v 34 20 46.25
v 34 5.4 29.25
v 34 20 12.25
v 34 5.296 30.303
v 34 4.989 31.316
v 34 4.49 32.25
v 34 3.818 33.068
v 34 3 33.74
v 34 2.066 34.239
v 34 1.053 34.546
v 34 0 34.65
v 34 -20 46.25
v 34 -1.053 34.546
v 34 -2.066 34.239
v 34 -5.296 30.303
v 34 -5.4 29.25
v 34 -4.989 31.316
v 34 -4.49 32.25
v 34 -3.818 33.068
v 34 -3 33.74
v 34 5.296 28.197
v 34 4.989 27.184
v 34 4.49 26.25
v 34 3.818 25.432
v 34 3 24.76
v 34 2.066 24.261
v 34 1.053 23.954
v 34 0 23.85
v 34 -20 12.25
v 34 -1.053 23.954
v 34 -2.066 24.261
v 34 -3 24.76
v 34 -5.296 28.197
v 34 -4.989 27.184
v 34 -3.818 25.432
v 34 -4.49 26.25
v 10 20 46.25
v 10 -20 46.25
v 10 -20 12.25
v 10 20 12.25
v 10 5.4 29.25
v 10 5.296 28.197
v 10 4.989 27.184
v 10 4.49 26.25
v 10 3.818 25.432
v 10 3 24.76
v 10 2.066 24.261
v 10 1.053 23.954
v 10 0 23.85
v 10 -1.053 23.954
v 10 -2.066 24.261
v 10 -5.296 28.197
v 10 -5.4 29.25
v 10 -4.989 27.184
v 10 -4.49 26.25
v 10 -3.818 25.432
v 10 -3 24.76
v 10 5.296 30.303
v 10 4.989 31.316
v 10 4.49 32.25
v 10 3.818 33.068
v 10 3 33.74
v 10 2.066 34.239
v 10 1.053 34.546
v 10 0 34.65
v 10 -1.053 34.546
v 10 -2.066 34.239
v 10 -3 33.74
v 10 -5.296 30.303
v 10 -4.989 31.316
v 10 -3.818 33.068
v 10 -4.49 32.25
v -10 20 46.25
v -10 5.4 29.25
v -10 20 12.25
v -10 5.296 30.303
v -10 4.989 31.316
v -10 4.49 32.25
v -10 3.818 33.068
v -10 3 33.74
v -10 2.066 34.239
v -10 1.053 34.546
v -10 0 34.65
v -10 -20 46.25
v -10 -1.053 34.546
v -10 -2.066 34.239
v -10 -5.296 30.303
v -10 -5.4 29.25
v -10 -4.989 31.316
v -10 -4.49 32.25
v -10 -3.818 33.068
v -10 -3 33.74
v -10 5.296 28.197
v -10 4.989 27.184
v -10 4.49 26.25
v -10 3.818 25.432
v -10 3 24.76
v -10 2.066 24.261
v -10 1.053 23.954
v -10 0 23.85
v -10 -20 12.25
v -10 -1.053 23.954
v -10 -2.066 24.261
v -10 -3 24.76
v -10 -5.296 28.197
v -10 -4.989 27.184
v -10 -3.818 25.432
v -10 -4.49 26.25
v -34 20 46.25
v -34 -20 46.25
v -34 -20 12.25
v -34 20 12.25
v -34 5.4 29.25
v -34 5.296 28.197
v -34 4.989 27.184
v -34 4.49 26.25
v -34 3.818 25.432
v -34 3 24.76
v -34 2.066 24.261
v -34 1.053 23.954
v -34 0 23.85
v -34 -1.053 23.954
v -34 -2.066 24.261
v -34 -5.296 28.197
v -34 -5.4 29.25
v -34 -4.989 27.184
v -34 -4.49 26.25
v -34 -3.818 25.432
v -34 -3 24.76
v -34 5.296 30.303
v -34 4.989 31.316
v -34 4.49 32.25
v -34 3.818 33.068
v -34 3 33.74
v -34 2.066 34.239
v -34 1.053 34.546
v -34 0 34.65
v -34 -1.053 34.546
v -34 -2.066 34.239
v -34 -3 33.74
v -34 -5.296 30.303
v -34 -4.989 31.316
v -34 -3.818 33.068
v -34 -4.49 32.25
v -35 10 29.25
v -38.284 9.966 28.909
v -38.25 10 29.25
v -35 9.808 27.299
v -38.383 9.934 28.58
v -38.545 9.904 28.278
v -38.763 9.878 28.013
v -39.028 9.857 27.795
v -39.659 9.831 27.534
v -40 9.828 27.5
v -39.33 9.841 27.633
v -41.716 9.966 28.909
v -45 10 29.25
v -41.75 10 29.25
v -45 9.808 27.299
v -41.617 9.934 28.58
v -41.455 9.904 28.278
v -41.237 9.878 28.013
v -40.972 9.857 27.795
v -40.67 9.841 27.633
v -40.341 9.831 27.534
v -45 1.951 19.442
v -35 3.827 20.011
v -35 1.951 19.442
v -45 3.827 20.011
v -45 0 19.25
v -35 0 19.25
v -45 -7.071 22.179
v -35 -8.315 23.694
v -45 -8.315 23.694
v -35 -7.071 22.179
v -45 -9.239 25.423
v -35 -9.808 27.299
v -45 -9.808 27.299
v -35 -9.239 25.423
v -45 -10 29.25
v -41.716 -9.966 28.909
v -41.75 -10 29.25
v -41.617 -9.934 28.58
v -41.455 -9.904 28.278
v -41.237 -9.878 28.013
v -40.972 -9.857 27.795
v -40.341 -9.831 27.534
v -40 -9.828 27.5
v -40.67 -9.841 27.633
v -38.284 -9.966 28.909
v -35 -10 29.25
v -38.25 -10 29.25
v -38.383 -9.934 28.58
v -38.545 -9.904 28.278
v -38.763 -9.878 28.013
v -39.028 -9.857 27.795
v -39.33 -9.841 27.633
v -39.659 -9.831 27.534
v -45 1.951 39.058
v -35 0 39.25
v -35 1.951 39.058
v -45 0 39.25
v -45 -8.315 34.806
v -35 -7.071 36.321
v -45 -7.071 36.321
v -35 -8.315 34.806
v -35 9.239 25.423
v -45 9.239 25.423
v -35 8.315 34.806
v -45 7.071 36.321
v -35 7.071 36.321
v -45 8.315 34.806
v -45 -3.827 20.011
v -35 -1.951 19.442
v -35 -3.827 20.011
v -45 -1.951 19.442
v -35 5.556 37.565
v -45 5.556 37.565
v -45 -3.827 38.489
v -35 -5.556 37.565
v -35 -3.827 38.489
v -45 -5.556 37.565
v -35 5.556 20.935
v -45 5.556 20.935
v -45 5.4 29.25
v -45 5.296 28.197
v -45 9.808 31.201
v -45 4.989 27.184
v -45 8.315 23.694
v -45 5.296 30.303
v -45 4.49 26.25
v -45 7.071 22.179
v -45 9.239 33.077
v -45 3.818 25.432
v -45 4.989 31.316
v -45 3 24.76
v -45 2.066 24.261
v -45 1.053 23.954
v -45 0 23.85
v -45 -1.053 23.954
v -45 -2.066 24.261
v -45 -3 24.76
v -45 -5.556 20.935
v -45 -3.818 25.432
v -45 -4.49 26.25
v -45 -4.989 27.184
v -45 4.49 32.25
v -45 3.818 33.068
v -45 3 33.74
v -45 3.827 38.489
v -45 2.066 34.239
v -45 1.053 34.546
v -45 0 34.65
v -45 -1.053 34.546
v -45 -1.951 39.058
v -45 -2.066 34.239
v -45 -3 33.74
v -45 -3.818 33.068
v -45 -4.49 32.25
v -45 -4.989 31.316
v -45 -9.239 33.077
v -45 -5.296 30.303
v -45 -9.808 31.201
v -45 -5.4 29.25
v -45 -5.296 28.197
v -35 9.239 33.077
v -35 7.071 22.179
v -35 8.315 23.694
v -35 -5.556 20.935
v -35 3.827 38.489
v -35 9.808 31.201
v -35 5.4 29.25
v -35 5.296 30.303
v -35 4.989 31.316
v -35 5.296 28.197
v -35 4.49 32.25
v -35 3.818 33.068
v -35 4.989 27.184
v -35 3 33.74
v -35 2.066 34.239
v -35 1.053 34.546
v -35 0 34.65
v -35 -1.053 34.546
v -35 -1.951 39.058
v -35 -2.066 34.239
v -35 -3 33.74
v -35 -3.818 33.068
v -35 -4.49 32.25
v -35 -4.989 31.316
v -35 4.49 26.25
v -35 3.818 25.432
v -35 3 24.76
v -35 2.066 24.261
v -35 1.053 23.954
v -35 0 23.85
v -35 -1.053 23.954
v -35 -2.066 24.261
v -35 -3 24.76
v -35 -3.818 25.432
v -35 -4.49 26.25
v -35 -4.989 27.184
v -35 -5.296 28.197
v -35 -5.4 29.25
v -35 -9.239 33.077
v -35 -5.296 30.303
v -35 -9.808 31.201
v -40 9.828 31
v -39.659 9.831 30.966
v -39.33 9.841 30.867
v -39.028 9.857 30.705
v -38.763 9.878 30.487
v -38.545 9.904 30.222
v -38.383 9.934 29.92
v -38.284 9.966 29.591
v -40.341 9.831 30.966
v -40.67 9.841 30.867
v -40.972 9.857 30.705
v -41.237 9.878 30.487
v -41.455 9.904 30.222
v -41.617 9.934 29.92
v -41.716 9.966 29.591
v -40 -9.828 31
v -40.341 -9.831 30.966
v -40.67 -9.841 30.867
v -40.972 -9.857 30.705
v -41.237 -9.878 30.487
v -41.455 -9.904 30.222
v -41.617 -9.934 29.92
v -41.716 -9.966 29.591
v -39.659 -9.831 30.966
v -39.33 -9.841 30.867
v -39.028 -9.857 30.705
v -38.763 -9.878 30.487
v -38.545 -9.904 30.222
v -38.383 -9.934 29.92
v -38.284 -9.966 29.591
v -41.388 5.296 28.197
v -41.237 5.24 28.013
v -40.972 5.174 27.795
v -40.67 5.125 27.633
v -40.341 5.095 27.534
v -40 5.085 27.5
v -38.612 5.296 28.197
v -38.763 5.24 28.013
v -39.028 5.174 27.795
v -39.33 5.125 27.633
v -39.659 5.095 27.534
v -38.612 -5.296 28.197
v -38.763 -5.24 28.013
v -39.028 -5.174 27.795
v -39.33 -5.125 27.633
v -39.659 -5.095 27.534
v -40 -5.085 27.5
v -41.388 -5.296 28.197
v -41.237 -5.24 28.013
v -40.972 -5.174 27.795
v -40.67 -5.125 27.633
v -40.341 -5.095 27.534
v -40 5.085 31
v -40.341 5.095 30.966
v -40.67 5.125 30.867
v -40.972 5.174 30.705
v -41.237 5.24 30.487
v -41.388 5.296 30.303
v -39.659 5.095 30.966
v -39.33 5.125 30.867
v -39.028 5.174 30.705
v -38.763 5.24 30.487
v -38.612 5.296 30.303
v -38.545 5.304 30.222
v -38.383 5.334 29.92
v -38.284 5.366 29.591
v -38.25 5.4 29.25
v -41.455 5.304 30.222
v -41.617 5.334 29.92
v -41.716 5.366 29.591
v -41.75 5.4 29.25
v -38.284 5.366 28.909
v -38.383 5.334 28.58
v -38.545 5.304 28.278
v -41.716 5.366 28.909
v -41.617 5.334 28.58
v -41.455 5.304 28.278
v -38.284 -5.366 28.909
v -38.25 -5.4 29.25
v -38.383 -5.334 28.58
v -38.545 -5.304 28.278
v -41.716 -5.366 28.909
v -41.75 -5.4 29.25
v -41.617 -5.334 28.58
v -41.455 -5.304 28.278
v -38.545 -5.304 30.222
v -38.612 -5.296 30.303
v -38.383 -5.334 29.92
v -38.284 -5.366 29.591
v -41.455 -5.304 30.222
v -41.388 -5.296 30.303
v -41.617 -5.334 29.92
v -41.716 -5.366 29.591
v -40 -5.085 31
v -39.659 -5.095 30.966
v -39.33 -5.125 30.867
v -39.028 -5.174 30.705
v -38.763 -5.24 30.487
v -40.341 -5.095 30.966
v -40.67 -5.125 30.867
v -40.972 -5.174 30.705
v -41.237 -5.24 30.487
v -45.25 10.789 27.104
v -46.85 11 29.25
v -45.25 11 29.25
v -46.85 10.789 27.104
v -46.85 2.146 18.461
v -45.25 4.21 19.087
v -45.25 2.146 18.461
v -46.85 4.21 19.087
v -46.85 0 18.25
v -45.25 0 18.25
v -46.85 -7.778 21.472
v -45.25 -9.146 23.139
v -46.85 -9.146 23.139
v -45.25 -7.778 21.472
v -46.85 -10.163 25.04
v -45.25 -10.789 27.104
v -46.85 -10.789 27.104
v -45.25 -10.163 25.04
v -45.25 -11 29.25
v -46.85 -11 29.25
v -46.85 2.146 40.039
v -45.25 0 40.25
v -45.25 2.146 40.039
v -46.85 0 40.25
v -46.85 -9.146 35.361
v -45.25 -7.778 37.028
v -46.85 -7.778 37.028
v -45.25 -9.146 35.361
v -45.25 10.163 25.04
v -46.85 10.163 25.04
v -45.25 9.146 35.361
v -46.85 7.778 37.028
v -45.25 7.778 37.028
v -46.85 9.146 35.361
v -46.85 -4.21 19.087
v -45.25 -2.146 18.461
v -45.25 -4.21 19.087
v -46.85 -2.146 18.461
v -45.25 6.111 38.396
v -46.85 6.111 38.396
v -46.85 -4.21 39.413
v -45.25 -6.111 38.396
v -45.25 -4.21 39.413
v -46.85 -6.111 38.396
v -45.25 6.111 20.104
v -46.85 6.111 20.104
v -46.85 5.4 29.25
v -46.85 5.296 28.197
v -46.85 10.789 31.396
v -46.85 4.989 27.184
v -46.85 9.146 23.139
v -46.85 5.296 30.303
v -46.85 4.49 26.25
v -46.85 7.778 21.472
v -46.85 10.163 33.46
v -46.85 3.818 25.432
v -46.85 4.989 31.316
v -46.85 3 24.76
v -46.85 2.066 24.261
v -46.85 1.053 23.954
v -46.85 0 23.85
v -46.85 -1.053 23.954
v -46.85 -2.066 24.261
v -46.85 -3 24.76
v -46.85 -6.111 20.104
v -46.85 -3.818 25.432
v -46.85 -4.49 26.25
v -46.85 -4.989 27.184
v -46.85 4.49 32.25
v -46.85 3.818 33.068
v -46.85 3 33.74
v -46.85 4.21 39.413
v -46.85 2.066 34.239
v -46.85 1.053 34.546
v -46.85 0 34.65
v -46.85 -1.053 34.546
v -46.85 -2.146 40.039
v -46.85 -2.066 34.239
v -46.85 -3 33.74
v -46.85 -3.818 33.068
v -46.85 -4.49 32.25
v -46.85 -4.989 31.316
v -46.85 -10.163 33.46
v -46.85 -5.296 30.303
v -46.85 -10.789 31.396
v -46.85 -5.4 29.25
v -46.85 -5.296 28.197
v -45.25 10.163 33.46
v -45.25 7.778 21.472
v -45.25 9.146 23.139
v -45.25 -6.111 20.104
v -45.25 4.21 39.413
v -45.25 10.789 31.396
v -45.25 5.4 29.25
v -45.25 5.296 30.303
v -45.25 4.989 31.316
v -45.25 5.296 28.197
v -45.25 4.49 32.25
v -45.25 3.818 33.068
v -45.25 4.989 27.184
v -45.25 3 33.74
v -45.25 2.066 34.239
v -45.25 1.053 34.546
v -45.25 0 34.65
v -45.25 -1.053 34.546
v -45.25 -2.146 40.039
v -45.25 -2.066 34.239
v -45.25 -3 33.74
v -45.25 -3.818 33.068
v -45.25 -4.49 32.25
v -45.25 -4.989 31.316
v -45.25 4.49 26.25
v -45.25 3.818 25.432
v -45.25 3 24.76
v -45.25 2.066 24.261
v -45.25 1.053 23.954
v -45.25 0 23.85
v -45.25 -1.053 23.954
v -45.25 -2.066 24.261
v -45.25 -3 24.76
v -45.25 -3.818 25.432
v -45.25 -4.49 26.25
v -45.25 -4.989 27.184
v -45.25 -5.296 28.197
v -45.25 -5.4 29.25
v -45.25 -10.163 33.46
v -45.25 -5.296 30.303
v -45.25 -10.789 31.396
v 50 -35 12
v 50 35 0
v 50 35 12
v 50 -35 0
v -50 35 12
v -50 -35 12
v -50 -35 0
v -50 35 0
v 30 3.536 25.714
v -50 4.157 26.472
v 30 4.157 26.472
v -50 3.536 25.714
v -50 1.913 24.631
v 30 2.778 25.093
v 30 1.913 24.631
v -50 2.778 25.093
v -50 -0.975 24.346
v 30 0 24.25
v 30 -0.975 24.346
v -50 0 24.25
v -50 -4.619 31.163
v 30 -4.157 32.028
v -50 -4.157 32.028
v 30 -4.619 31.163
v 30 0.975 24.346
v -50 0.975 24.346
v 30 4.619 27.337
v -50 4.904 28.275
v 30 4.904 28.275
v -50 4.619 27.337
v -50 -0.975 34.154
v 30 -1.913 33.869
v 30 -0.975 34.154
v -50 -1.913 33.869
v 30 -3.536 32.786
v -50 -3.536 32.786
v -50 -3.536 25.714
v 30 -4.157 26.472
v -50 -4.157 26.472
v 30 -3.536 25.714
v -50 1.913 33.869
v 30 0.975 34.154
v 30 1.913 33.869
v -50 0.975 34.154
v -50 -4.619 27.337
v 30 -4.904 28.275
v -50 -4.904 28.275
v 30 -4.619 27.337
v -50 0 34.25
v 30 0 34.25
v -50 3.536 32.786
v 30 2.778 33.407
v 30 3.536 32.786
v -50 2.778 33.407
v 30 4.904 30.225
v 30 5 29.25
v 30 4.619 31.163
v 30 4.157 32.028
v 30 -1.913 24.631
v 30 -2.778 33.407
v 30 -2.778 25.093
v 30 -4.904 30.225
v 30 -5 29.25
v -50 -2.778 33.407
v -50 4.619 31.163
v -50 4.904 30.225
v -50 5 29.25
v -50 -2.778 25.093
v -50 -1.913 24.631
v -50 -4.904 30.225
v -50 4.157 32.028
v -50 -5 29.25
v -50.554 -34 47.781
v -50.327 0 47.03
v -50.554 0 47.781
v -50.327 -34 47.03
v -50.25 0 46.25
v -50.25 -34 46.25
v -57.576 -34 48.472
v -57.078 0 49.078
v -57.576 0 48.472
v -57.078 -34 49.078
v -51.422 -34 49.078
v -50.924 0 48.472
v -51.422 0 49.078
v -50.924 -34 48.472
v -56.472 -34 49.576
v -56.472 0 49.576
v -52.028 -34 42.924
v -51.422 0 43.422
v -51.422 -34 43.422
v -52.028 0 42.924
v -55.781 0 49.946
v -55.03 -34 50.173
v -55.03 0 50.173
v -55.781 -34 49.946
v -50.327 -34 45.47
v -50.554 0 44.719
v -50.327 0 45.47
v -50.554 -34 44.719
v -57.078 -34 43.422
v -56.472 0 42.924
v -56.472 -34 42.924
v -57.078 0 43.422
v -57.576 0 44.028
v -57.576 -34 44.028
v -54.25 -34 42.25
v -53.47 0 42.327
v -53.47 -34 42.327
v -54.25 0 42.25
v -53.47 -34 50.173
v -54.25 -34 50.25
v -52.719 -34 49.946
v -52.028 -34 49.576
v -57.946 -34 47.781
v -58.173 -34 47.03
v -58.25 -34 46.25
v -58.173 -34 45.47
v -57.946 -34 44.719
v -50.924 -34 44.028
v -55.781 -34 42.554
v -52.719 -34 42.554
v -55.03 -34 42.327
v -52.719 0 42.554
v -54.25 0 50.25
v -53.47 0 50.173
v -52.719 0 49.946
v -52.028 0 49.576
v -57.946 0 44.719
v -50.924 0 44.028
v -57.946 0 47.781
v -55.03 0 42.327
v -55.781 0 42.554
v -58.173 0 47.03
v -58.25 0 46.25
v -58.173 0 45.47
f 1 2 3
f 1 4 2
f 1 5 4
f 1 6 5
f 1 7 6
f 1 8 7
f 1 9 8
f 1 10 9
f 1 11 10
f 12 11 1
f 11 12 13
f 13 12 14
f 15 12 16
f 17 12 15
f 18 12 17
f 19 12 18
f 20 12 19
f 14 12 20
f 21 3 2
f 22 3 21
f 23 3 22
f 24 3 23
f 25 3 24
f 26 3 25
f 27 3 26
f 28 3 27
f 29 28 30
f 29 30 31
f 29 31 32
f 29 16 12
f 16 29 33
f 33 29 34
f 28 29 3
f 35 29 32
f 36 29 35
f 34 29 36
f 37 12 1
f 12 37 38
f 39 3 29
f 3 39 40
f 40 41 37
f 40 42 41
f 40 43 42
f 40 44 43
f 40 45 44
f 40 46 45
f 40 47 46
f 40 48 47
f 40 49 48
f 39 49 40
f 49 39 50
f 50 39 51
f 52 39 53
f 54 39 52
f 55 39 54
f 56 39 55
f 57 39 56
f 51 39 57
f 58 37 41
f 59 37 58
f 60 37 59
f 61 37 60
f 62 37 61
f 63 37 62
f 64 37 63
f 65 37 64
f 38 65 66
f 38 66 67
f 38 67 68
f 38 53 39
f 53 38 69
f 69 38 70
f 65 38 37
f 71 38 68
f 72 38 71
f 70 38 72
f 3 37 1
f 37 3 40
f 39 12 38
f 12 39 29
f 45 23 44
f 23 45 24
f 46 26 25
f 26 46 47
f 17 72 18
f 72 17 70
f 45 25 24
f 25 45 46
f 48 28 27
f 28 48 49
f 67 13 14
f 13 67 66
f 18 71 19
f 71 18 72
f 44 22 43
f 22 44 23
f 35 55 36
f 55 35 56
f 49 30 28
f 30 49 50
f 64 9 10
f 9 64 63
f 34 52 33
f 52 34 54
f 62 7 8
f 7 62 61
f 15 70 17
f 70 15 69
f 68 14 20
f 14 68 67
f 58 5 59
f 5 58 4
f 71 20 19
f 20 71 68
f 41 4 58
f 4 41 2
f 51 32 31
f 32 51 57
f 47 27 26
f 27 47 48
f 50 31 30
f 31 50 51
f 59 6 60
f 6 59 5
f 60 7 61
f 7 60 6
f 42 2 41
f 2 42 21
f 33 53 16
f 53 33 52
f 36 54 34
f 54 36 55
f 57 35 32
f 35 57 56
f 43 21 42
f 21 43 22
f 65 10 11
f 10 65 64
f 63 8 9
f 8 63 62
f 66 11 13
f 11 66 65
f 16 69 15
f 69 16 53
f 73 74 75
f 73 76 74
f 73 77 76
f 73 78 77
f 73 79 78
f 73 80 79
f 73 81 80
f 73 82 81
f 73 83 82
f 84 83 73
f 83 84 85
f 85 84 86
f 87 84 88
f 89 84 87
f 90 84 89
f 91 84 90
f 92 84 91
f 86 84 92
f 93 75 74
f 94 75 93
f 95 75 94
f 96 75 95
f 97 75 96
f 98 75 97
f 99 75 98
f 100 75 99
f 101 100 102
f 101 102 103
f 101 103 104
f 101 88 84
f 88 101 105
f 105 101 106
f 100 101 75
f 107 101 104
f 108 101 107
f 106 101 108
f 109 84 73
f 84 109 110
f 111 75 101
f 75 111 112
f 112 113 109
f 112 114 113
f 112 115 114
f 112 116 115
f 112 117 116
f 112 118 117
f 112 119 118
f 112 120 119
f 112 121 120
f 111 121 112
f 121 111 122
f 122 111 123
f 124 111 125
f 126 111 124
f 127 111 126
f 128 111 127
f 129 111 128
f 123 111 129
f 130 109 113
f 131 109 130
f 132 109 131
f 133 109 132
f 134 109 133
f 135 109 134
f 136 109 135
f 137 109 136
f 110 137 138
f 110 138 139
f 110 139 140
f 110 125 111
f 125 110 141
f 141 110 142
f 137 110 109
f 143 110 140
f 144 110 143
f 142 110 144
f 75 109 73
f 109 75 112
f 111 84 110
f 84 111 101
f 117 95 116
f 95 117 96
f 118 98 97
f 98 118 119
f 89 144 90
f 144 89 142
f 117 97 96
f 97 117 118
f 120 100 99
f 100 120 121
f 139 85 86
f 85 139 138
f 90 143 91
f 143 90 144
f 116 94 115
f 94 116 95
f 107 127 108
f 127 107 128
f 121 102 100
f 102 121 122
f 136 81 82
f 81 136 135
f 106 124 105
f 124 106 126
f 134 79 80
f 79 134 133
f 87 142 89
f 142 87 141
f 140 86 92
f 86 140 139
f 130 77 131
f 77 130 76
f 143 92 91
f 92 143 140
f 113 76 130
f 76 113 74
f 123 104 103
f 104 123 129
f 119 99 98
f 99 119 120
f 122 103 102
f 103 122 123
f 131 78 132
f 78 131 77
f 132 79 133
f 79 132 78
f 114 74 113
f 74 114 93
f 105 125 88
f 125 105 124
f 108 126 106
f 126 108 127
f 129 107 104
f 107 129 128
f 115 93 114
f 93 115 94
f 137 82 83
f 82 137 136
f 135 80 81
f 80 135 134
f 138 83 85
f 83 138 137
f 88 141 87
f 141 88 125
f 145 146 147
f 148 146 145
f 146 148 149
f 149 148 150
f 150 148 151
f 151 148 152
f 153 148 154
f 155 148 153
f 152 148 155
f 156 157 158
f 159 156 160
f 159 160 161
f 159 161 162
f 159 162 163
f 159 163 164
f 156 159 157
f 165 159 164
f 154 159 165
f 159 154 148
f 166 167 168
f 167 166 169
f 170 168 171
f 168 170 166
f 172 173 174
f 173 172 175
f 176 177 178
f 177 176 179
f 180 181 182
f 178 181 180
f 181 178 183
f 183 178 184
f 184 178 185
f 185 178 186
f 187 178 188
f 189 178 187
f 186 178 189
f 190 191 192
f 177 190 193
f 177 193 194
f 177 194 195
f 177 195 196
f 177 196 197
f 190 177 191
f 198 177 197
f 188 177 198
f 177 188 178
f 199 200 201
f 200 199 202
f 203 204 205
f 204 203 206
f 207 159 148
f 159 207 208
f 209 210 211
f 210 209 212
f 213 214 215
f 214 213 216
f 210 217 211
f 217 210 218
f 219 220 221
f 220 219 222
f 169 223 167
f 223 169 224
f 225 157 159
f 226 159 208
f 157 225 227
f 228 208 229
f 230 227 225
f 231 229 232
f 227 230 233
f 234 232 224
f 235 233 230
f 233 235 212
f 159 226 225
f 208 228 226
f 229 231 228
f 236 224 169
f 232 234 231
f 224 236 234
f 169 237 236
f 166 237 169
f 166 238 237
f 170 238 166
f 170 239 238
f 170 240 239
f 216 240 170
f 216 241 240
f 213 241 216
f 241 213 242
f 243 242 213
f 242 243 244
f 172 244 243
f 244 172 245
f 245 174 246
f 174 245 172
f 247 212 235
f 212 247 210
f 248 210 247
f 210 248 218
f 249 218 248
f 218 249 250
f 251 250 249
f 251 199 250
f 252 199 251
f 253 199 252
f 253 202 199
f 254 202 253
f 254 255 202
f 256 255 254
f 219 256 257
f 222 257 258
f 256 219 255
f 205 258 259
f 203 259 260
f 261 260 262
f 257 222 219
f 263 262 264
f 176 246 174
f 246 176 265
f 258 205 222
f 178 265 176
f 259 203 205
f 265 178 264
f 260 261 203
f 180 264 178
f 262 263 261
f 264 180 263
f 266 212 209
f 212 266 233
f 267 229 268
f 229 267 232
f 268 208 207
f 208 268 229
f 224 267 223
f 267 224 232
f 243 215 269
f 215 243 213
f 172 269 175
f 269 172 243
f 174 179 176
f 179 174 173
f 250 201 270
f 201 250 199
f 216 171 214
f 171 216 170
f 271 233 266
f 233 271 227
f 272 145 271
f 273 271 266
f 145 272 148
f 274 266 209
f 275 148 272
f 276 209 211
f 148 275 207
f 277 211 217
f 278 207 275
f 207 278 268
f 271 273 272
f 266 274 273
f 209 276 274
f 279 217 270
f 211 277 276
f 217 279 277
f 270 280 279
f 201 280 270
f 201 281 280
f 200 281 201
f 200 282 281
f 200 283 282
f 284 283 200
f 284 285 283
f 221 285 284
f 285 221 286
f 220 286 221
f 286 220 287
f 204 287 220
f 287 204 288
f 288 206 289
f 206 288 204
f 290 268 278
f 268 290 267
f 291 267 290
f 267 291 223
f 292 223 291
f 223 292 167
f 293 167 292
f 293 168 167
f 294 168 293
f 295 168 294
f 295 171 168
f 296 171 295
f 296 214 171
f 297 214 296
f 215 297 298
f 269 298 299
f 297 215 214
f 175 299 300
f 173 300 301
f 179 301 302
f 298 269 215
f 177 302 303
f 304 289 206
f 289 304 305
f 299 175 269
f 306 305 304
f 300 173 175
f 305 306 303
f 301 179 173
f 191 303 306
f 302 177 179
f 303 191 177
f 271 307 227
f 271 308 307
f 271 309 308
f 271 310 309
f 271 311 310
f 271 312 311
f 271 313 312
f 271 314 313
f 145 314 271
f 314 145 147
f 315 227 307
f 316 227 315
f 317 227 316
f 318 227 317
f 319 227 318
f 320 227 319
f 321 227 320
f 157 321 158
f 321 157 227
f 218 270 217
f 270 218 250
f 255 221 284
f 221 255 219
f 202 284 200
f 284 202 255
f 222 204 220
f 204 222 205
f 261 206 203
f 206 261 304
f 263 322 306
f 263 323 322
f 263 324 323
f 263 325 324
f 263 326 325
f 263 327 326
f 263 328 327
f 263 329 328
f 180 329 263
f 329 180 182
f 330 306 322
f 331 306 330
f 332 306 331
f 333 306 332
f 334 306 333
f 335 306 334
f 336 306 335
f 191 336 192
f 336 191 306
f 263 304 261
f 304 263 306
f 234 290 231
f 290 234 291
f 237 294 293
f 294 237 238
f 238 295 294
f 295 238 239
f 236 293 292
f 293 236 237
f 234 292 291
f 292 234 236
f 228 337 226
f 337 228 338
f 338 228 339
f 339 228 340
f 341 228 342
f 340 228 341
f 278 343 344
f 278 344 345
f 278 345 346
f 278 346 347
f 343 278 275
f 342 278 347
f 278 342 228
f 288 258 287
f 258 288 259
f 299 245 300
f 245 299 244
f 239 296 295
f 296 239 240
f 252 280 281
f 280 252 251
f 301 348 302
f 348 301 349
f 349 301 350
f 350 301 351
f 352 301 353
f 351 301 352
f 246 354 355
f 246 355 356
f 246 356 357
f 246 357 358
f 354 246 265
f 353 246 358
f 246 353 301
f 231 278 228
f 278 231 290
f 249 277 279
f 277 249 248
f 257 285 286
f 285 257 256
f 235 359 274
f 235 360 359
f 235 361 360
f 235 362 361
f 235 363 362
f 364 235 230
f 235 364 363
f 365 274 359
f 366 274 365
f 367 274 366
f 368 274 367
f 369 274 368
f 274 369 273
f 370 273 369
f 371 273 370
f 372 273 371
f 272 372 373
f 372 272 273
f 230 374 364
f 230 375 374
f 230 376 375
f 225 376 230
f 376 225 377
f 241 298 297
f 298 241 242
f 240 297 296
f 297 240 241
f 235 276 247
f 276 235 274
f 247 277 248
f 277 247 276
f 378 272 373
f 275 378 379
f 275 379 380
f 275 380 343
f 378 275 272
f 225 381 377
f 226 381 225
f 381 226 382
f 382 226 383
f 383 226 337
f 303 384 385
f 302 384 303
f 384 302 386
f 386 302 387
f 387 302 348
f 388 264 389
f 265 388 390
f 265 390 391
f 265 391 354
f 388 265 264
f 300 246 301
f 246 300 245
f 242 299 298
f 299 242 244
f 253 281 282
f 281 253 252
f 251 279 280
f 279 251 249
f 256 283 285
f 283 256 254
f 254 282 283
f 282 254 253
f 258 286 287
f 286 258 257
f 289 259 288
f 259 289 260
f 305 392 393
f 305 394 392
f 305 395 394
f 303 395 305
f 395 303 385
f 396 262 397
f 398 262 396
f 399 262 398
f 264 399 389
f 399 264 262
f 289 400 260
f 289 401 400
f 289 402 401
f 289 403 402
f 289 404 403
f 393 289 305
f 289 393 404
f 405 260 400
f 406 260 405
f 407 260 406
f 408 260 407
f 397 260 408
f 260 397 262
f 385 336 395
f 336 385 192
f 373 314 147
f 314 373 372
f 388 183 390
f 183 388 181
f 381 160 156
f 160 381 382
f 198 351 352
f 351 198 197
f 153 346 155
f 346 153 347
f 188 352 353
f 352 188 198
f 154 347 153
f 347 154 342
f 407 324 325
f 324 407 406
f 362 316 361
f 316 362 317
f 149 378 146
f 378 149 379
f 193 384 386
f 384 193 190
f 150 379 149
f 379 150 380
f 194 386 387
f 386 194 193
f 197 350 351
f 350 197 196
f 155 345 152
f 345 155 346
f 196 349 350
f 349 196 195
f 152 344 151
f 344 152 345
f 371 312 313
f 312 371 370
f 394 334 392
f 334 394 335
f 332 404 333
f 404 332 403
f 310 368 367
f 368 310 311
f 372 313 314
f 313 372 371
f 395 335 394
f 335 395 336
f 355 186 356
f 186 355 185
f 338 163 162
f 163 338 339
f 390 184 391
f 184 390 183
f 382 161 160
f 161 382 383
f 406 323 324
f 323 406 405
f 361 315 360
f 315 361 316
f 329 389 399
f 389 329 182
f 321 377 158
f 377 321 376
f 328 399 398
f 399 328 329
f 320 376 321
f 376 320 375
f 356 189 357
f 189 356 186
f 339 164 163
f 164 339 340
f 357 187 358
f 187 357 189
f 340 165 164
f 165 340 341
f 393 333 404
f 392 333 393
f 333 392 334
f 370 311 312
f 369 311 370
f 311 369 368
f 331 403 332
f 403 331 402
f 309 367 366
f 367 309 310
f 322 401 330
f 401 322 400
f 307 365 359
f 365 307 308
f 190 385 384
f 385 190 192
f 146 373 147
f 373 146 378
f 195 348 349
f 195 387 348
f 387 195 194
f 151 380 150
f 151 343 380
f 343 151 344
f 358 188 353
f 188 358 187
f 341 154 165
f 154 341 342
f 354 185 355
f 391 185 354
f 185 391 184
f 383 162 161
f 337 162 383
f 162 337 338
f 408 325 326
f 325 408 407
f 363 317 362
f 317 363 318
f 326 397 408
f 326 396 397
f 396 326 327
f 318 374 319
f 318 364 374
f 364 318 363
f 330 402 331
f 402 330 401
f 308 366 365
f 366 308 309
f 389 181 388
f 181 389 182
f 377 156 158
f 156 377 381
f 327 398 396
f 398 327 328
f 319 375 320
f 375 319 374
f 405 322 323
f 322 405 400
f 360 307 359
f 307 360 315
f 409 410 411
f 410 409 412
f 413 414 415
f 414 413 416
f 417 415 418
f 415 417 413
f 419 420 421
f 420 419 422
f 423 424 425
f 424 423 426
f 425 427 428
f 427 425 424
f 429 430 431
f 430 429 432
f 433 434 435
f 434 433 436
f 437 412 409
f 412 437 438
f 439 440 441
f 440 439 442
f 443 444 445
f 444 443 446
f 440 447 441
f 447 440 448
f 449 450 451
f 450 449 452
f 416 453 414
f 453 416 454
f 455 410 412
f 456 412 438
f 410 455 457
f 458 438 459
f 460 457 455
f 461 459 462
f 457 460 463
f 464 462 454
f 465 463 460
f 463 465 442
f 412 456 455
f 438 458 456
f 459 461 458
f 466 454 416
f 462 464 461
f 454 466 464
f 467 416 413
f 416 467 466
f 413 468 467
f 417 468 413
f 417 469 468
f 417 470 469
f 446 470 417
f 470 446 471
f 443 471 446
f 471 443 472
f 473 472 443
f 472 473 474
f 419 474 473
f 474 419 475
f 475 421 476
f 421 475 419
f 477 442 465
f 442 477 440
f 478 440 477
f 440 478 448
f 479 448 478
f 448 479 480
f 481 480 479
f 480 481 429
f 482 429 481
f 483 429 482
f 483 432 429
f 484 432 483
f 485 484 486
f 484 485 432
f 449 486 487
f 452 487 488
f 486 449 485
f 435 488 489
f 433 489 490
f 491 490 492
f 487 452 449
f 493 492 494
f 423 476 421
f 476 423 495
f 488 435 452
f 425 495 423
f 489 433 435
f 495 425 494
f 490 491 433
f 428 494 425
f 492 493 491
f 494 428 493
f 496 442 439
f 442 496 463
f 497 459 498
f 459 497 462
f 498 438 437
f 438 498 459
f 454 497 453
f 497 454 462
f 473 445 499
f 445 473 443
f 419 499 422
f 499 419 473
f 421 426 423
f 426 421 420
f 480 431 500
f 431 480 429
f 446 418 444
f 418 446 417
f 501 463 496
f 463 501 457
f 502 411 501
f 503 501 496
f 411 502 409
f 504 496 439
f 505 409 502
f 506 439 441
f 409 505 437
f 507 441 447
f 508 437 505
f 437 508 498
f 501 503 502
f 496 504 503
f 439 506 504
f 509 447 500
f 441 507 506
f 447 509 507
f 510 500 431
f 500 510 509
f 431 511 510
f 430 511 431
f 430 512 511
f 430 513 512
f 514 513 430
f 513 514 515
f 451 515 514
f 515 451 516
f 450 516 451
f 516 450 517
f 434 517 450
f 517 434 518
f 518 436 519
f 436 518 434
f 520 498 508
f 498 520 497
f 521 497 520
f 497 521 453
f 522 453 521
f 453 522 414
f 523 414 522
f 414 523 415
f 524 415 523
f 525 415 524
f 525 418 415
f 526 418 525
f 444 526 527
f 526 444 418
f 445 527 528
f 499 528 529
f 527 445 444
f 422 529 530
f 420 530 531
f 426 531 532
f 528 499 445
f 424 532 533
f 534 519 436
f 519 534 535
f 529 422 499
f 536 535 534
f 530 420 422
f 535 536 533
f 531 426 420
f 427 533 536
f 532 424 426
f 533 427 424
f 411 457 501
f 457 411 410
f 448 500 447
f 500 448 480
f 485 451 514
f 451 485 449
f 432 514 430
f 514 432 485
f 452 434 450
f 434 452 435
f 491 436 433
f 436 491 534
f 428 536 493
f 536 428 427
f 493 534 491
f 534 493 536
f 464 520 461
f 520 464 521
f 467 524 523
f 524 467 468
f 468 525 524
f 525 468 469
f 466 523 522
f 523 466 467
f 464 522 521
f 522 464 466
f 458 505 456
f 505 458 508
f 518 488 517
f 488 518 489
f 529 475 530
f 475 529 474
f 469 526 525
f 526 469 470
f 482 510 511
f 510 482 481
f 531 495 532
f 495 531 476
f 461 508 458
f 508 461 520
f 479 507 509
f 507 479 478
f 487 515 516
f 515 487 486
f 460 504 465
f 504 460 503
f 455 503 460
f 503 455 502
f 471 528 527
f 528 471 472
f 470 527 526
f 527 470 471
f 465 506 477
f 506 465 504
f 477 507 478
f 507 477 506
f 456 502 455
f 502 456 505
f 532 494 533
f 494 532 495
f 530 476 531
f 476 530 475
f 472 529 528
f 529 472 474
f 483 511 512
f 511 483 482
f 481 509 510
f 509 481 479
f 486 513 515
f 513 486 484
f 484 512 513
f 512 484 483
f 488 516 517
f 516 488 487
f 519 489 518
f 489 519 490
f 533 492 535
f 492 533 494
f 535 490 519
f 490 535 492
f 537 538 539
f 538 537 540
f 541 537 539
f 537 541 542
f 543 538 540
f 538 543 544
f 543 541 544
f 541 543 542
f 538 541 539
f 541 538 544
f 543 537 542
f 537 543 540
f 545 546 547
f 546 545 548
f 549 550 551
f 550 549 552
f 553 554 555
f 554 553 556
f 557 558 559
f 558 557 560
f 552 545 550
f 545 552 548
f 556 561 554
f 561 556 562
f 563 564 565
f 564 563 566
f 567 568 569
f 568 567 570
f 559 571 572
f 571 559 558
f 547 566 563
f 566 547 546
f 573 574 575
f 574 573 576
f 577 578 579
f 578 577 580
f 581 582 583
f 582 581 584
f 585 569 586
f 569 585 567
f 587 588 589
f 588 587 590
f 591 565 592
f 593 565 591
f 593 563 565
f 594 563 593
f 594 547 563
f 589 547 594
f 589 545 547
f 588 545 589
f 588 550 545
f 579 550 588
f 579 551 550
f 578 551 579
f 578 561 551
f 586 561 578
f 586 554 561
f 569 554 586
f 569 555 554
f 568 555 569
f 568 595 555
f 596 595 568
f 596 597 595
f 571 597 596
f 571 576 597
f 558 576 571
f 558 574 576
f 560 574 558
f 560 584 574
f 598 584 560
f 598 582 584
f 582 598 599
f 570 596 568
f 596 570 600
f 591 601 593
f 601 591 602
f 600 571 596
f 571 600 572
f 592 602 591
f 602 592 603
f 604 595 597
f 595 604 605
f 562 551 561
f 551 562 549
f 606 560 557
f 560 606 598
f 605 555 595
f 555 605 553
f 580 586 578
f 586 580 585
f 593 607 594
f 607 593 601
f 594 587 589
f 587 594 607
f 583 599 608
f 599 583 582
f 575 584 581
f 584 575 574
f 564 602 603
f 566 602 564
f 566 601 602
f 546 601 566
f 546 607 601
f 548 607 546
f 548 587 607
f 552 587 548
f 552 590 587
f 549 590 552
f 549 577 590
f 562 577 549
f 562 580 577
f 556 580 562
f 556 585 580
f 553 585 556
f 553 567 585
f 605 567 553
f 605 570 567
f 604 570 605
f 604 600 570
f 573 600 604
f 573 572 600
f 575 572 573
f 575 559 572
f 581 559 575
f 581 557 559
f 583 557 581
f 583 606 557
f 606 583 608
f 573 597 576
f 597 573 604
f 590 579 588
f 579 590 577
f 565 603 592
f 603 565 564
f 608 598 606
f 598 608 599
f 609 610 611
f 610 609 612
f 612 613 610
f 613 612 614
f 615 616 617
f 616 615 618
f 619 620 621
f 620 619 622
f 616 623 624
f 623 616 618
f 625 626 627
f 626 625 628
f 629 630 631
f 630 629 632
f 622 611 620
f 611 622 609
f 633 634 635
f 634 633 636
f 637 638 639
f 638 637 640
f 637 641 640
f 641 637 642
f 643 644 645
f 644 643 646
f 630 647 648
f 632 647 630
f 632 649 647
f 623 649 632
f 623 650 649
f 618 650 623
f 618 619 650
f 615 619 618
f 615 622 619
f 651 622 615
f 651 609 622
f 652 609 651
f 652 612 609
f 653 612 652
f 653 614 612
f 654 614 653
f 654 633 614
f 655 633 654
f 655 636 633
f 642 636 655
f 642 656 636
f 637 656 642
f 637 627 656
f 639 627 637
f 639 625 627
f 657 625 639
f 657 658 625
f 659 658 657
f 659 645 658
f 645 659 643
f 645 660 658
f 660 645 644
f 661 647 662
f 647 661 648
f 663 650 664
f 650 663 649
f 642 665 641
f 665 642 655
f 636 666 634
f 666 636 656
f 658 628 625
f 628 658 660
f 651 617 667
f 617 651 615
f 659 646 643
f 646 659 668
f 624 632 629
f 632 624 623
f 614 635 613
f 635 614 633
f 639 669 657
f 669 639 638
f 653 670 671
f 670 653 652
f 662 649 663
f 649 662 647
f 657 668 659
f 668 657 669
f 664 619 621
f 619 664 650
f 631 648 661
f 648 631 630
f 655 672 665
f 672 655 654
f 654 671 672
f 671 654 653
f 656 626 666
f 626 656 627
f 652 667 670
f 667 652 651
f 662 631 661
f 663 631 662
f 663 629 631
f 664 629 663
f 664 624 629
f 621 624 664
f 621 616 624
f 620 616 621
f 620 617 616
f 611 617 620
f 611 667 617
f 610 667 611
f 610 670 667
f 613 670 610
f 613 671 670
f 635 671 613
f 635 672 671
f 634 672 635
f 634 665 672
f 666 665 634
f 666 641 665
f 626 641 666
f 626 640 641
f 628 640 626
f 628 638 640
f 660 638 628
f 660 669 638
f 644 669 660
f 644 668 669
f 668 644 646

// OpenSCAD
$fn = 32;

// ------------------------------------------------------------------------
// Machine vise: screw d10, jaws 24 x 34 mm
// Every part is its own module, assembly() places every instance.
// ------------------------------------------------------------------------

// --- part 1 ---
module vise_bed() {
  difference() {
    translate([-50, -35, 0]) cube([100, 70, 12]);
  }
}

// --- part 2 ---
module vise_jaw() {
  difference() {
    translate([-12, -20, 0]) cube([24, 40, 34]);
    translate([0, 0, 17]) rotate([0, 90, 0]) cylinder(h = 26, d = 10.8, center = true);
  }
}

// --- part 3 ---
module vise_screw() {
  translate([0, 0, -40]) cylinder(h = 80, d = 10);
}

// --- part 4 ---
module screw_collar() {
  difference() {
    cylinder(h = 10, d = 20);
    translate([0, 0, -1]) cylinder(h = 12, d = 10.8);
    translate([0, 0, 5]) rotate([90, 0, 0]) cylinder(h = 22, d = 3.5, center = true);
  }
}

// --- part 5 ---
module screw_washer() {
  difference() {
      translate([0, 0, 0]) cylinder(h = 1.6, d = 22);
      translate([0, 0, -1]) cylinder(h = 3.6, d = 10.8);
    }
}

// --- part 6 ---
module vise_handle() {
  cylinder(h = 34, d = 8);
}

// --- assembly ---
module assembly() {
  color([0.80, 0.24, 0.20]) translate([0, 0, 0]) rotate([0, 0, 0]) vise_bed();
  color([0.20, 0.45, 0.75]) translate([22, 0, 12.25]) rotate([0, 0, 0]) vise_jaw();
  color([0.25, 0.62, 0.32]) translate([-22, 0, 12.25]) rotate([0, 0, 0]) vise_jaw();
  color([0.92, 0.70, 0.18]) translate([-10, 0, 29.25]) rotate([0, 90, 0]) vise_screw();
  color([0.58, 0.35, 0.70]) translate([-45, 0, 29.25]) rotate([0, 90, 0]) screw_collar();
  color([0.16, 0.66, 0.66]) translate([-46.85, 0, 29.25]) rotate([0, 90, 0]) screw_washer();
  color([0.85, 0.48, 0.18]) translate([-54.25, 0, 46.25]) rotate([90, 0, 0]) vise_handle();
}

assembly();
